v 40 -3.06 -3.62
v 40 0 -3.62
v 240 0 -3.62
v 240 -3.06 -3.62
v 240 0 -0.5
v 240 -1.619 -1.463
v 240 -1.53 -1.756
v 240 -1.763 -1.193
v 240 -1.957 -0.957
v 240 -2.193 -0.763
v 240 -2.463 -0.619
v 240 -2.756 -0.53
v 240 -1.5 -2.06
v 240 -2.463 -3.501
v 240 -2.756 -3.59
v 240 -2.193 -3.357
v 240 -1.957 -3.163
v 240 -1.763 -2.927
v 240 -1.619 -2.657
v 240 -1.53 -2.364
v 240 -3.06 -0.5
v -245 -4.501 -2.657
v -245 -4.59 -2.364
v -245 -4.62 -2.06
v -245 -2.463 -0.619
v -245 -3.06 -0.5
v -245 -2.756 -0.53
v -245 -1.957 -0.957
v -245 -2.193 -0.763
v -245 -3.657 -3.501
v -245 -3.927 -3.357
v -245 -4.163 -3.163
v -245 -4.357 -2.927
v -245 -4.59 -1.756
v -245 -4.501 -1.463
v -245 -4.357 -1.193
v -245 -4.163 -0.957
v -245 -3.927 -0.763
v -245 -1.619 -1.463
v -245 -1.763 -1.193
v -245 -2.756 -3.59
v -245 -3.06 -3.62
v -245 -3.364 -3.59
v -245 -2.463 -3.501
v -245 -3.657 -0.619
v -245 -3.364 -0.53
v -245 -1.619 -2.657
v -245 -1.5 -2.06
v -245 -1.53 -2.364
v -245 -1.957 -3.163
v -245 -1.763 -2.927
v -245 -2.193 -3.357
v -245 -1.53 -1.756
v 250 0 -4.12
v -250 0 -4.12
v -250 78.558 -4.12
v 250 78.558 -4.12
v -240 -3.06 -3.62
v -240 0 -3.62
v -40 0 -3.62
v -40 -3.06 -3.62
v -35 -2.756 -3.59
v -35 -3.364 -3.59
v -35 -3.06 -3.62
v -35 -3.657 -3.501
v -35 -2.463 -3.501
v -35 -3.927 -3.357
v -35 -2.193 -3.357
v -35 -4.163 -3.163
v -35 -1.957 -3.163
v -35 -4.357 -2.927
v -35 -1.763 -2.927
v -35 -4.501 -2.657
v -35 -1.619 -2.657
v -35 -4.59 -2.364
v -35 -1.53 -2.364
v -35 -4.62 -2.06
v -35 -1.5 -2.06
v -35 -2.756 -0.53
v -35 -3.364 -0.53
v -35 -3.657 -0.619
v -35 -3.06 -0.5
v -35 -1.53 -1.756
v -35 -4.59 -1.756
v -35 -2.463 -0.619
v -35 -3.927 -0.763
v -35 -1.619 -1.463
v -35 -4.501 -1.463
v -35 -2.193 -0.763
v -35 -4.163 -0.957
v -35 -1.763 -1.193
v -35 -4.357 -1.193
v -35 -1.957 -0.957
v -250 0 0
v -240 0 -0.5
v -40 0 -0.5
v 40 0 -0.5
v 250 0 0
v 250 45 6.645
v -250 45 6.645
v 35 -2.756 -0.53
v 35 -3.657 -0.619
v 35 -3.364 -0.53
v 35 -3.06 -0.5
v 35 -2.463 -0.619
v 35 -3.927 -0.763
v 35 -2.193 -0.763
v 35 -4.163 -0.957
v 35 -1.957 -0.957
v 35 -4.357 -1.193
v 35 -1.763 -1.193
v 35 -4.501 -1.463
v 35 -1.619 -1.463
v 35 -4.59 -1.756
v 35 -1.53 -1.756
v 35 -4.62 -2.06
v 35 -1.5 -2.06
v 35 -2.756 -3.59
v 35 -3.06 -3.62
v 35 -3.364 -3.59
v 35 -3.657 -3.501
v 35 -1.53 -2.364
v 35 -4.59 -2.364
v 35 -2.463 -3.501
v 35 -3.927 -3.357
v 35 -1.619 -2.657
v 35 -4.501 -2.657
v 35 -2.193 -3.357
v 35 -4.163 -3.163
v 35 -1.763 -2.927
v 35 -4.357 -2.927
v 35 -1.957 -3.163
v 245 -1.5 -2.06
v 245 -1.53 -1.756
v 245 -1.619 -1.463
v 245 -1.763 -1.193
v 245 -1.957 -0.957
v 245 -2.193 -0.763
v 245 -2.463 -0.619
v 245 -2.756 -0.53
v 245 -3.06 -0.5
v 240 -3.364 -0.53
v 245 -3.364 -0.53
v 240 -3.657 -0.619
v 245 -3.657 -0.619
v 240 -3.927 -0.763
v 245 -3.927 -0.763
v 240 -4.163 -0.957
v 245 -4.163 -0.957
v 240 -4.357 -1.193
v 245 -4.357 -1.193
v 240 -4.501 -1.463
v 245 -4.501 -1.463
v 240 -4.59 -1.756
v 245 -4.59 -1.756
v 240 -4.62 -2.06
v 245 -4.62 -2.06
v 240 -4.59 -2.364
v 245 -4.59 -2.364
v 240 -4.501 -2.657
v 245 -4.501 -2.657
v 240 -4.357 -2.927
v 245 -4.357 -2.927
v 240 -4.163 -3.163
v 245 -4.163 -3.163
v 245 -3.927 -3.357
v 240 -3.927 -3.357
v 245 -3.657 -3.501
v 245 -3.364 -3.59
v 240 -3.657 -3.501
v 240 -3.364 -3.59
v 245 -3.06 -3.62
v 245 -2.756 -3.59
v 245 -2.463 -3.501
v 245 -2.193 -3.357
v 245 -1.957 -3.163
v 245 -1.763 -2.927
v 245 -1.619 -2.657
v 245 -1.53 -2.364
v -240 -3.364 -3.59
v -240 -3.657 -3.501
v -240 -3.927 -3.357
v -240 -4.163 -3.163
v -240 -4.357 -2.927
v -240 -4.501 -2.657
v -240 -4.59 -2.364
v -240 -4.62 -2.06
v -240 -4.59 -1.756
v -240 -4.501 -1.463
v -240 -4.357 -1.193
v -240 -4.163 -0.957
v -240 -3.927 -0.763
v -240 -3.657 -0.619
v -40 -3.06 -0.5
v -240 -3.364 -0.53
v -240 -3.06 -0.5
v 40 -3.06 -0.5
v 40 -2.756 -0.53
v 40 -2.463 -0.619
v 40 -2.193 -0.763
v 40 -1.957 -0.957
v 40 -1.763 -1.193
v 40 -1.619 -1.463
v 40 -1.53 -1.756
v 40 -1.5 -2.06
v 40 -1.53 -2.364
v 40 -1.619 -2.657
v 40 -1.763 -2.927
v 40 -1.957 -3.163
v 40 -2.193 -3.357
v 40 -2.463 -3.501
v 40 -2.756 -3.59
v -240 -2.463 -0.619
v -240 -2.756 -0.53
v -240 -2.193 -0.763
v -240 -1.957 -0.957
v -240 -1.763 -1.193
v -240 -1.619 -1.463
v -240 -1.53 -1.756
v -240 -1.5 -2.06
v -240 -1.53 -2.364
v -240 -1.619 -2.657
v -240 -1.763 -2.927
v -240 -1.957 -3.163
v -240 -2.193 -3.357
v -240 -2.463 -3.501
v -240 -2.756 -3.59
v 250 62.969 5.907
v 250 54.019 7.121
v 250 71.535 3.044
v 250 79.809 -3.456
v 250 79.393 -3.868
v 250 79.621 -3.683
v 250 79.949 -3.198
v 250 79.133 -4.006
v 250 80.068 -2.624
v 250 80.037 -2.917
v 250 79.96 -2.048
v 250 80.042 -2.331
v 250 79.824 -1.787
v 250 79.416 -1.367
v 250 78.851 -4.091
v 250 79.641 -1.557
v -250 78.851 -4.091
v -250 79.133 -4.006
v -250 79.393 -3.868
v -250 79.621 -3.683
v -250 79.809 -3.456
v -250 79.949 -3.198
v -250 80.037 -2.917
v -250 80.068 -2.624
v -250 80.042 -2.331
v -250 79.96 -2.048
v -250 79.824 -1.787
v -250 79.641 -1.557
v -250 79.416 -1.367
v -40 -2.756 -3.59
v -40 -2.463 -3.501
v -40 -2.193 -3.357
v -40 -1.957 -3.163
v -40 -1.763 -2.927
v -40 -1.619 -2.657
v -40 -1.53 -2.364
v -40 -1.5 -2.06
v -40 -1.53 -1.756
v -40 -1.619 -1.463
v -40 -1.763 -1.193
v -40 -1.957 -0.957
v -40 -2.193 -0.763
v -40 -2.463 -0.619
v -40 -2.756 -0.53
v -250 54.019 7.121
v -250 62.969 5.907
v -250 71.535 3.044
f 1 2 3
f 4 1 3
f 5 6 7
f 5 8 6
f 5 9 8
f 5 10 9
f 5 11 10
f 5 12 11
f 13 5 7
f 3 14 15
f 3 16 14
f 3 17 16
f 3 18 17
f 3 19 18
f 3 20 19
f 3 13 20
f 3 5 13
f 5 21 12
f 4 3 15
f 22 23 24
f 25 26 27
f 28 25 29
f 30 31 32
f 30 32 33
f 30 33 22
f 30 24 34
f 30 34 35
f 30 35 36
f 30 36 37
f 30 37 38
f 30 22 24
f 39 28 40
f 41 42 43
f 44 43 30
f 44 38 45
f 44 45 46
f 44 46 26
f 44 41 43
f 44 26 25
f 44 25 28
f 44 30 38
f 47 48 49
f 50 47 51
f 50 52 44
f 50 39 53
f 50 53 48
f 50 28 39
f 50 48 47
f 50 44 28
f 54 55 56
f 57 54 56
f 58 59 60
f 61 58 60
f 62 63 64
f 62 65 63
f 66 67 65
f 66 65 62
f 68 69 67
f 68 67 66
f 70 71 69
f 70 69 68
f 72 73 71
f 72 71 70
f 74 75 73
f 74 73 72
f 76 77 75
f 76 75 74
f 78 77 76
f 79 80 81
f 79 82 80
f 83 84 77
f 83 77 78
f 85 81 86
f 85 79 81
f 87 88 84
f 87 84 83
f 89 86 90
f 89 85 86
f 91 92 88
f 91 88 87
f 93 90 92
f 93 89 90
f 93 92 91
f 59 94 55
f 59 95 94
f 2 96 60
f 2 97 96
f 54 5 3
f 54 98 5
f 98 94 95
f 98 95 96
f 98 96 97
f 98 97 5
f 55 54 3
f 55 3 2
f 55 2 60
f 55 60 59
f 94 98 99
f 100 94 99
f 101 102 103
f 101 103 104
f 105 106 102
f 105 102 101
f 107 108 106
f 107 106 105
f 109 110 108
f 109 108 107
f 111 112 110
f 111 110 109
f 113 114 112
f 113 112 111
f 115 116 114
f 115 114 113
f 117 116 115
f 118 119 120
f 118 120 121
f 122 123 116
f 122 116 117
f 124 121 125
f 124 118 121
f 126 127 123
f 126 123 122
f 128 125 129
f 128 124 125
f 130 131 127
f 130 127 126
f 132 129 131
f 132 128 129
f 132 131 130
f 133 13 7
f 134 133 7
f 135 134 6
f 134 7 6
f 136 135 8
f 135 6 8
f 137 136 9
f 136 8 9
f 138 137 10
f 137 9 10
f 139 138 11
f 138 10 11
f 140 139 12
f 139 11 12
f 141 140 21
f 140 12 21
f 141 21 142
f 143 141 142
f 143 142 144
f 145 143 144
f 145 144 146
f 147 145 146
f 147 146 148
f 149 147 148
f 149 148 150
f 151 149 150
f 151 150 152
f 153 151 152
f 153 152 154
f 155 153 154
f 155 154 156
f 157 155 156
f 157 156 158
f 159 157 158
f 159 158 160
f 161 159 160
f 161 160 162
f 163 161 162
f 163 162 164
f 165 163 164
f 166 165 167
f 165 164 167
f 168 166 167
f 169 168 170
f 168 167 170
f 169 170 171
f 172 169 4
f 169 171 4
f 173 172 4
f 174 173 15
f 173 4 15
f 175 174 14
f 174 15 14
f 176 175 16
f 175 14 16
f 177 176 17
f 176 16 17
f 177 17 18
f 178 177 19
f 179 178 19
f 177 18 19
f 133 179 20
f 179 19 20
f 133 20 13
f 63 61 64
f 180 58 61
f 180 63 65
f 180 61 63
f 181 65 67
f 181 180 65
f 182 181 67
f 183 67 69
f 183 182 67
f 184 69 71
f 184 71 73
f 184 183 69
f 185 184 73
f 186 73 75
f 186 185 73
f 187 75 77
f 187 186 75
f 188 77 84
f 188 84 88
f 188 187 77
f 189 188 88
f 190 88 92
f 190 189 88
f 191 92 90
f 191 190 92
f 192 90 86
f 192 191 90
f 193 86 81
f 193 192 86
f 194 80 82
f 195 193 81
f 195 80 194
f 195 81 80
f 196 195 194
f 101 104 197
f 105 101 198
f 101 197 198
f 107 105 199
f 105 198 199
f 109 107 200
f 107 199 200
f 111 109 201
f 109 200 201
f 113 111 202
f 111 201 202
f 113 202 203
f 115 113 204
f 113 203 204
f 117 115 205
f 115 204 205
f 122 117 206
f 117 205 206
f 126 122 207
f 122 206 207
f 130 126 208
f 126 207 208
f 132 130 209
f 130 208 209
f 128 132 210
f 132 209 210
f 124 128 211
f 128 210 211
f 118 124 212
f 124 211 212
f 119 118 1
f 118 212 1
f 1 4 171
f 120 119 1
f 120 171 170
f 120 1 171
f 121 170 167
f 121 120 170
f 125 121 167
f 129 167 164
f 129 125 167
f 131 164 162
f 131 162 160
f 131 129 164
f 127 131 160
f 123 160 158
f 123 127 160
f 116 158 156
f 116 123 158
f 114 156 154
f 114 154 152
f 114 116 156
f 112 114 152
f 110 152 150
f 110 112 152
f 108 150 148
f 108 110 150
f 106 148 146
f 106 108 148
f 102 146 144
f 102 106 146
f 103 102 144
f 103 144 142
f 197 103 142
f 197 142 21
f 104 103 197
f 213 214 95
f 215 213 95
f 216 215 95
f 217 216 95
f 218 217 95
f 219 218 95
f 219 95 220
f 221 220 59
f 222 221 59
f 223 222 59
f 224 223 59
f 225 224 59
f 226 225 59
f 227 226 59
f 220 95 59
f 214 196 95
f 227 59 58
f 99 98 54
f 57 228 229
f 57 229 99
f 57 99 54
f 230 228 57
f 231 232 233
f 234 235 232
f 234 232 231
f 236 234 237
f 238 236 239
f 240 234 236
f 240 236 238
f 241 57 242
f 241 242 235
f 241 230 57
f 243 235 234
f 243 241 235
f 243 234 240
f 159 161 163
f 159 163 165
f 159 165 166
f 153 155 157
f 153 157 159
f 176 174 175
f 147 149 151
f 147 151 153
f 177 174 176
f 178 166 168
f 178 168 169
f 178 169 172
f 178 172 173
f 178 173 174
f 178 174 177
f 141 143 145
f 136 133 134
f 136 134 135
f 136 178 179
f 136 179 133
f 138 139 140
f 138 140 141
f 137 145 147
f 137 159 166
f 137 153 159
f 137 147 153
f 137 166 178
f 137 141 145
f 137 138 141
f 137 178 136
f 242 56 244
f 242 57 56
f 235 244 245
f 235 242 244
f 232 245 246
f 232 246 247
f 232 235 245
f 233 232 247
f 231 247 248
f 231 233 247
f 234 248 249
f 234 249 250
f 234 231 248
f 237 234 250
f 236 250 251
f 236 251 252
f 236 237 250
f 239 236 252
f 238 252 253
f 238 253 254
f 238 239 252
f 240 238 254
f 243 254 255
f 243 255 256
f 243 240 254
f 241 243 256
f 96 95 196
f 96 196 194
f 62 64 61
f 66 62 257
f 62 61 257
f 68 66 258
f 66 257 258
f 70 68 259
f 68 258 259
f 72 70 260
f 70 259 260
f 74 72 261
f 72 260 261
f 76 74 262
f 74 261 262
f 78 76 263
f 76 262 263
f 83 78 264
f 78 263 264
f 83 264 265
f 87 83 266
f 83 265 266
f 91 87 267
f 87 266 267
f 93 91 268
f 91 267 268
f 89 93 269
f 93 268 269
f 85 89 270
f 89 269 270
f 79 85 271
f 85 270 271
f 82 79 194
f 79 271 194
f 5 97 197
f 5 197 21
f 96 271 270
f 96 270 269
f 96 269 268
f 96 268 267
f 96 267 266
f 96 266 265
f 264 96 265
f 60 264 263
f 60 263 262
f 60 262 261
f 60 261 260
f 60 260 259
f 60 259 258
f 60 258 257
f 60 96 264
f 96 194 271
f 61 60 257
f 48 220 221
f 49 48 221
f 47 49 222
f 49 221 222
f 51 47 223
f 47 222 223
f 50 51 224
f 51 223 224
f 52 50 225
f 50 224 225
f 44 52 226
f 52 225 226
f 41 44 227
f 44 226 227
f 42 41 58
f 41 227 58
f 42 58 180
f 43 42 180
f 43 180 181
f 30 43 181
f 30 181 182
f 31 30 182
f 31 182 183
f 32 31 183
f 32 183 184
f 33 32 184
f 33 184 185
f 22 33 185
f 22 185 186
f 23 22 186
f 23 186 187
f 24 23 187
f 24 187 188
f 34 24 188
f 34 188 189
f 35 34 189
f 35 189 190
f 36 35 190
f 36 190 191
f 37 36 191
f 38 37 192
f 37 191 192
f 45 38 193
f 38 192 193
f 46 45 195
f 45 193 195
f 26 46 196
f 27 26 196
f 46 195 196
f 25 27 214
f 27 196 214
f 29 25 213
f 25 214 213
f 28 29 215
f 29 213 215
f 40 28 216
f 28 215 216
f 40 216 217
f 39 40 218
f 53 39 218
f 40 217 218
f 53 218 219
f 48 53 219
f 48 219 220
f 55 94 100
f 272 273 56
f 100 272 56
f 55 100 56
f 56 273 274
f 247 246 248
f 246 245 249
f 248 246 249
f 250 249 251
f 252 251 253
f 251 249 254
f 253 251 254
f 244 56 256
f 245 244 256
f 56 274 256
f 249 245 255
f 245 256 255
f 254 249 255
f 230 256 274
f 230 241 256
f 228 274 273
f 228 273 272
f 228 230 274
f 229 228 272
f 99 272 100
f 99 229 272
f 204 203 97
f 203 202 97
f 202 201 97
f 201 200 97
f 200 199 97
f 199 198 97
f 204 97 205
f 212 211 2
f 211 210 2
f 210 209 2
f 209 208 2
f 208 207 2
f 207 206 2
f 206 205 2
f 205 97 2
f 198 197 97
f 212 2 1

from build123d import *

# Parameters (mm, degrees)
PAD021_DEPTH    = 250
SKETCH046_W     = 3.12
SKETCH046_H     = 200
PAD022_DEPTH    = 4.62
SKETCH047_R     = 1.56
PAD023_DEPTH    = 5
SKETCH048_R     = 1.56
PAD024_DEPTH    = 5
SKETCH049_R     = 1.56
PAD025_DEPTH    = 5
SKETCH050_R     = 1.56
PAD026_DEPTH    = 5
POCKET024_DEPTH = 480


with BuildPart() as part:
    # Sketch045 → Pad021 (new body, symmetric)
    with BuildSketch(Plane.YZ):
        with BuildLine():
            ThreePointArc((79.416029, -1.367224), (62.968794, 5.906774), (45, 6.645022))
            Line((0, 0), (45, 6.645022))
            Line((0, 0), (0, -4.12))
            Line((0, -4.12), (78.558353, -4.12))
            ThreePointArc((78.558353, -4.12), (80, -3.059171), (79.416029, -1.367224))
        make_face()
    extrude(amount=PAD021_DEPTH, both=True)

    # Sketch046 (on Face3 of Pad021) → Pad022 (join)
    with BuildSketch(Plane(origin=(0, 0, 0), x_dir=(0, 0, -1), z_dir=(0, -1, 0))):
        with Locations((2.06, 140)):
            Rectangle(SKETCH046_W, SKETCH046_H)
        with Locations((2.06, -140)):
            Rectangle(SKETCH046_W, SKETCH046_H)
    extrude(amount=PAD022_DEPTH)

    # Sketch047 (on Face11 of Pad022) → Pad023 (join)
    with BuildSketch(Plane.YZ.offset(240)):
        with Locations((-3.06, -2.06)):
            Circle(SKETCH047_R)
    extrude(amount=PAD023_DEPTH)

    # Sketch048 (on Face9 of Pad023) → Pad024 (join)
    with BuildSketch(Plane(origin=(40, 0, 0), x_dir=(0, 1, 0), z_dir=(-1, 0, 0))):
        with Locations((-3.06, 2.06)):
            Circle(SKETCH048_R)
    extrude(amount=PAD024_DEPTH)

    # Sketch049 (on Face15 of Pad024) → Pad025 (join)
    with BuildSketch(Plane.YZ.offset(-40)):
        with Locations((-3.06, -2.06)):
            Circle(SKETCH049_R)
    extrude(amount=PAD025_DEPTH)

    # Sketch050 (on Face13 of Pad025) → Pad026 (join)
    with BuildSketch(Plane(origin=(-240, 0, 0), x_dir=(0, 1, 0), z_dir=(-1, 0, 0))):
        with Locations((-3.06, 2.06)):
            Circle(SKETCH050_R)
    extrude(amount=PAD026_DEPTH)

    # Sketch052 (on Face13 of Pad026) → Pocket024 (cut)
    with BuildSketch(Plane(origin=(-240, 0, 0), x_dir=(0, 1, 0), z_dir=(-1, 0, 0))):
        with BuildLine():
            ThreePointArc((-3.06, 3.62), (-4.619996, 2.06), (-3.06, 0.5))
            Line((-4.62, 0.5), (-3.06, 0.5))
            Line((-4.62, 3.62), (-4.62, 0.5))
            Line((-4.62, 3.62), (-3.06, 3.62))
        make_face()
    extrude(amount=-POCKET024_DEPTH, mode=Mode.SUBTRACT)


solid = part.part
